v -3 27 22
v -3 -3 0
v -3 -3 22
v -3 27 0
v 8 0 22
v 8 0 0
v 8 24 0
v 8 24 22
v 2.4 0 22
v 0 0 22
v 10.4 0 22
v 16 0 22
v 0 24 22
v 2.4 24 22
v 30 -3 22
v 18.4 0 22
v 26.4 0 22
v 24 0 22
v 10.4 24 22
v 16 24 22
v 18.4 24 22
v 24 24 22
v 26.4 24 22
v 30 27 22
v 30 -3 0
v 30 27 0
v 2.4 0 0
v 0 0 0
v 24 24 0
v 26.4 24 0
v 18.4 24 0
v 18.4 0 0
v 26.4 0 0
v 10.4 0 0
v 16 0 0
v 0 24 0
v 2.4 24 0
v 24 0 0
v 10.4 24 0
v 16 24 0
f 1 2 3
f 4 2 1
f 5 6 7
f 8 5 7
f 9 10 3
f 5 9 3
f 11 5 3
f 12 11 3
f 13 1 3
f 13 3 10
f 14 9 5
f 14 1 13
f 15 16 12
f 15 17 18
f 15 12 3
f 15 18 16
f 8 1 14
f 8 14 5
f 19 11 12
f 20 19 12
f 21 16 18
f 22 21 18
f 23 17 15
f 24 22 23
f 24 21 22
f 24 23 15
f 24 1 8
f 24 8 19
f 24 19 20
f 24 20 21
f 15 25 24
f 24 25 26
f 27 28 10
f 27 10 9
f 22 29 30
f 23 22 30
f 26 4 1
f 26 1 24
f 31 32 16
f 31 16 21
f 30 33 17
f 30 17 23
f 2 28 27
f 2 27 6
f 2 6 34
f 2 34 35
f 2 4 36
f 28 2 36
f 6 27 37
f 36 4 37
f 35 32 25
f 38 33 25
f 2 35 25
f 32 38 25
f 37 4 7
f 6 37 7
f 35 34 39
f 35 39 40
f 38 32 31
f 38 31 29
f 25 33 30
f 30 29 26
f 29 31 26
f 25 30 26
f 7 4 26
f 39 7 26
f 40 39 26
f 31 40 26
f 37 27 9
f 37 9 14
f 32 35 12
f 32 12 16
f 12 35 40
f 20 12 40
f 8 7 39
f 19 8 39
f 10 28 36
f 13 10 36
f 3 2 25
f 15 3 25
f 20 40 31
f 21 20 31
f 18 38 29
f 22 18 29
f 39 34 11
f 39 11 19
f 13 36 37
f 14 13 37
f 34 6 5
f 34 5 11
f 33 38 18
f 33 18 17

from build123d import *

# Parameters (mm, degrees)
BOX004_W     = 2.4
BOX004_H     = 24
BOX004_DEPTH = 22
BOX002_W     = 2.4
BOX002_H     = 24
BOX002_DEPTH = 22
BOX001_W     = 2.4
BOX001_H     = 24
BOX001_DEPTH = 22
BOX003_W     = 2.4
BOX003_H     = 24
BOX003_DEPTH = 22
BOX_W        = 33
BOX_H        = 30
BOX_DEPTH    = 22


with BuildPart() as cub004:
    # Box004 → Box004 (new body)
    with BuildSketch(Plane(origin=(24, 0, 0), x_dir=(1, 0, 0), z_dir=(0, 0, 1))):
        with Locations((1.2, 12)):
            Rectangle(BOX004_W, BOX004_H)
    extrude(amount=BOX004_DEPTH)


with BuildPart() as cub002:
    # Box002 → Box002 (new body)
    with BuildSketch(Plane(origin=(8, 0, 0), x_dir=(1, 0, 0), z_dir=(0, 0, 1))):
        with Locations((1.2, 12)):
            Rectangle(BOX002_W, BOX002_H)
    extrude(amount=BOX002_DEPTH)


with BuildPart() as fusion:
    # Box001 → Box001 (new body)
    with BuildSketch(Plane.XY):
        with Locations((1.2, 12)):
            Rectangle(BOX001_W, BOX001_H)
    extrude(amount=BOX001_DEPTH)

    # Fusion: union Cub002
    add(cub002.part)


with BuildPart() as fusion001:
    # Box003 → Box003 (new body)
    with BuildSketch(Plane(origin=(16, 0, 0), x_dir=(1, 0, 0), z_dir=(0, 0, 1))):
        with Locations((1.2, 12)):
            Rectangle(BOX003_W, BOX003_H)
    extrude(amount=BOX003_DEPTH)

    # Fusion001: union Cub004, Fusion
    add(cub004.part)
    add(fusion.part)


with BuildPart() as cut:
    # Box → Box (new body)
    with BuildSketch(Plane(origin=(-3, -3, 0), x_dir=(1, 0, 0), z_dir=(0, 0, 1))):
        with Locations((16.5, 15)):
            Rectangle(BOX_W, BOX_H)
    extrude(amount=BOX_DEPTH)

    # Cut: cut Fusion001
    add(fusion001.part, mode=Mode.SUBTRACT)


solid = cut.part
